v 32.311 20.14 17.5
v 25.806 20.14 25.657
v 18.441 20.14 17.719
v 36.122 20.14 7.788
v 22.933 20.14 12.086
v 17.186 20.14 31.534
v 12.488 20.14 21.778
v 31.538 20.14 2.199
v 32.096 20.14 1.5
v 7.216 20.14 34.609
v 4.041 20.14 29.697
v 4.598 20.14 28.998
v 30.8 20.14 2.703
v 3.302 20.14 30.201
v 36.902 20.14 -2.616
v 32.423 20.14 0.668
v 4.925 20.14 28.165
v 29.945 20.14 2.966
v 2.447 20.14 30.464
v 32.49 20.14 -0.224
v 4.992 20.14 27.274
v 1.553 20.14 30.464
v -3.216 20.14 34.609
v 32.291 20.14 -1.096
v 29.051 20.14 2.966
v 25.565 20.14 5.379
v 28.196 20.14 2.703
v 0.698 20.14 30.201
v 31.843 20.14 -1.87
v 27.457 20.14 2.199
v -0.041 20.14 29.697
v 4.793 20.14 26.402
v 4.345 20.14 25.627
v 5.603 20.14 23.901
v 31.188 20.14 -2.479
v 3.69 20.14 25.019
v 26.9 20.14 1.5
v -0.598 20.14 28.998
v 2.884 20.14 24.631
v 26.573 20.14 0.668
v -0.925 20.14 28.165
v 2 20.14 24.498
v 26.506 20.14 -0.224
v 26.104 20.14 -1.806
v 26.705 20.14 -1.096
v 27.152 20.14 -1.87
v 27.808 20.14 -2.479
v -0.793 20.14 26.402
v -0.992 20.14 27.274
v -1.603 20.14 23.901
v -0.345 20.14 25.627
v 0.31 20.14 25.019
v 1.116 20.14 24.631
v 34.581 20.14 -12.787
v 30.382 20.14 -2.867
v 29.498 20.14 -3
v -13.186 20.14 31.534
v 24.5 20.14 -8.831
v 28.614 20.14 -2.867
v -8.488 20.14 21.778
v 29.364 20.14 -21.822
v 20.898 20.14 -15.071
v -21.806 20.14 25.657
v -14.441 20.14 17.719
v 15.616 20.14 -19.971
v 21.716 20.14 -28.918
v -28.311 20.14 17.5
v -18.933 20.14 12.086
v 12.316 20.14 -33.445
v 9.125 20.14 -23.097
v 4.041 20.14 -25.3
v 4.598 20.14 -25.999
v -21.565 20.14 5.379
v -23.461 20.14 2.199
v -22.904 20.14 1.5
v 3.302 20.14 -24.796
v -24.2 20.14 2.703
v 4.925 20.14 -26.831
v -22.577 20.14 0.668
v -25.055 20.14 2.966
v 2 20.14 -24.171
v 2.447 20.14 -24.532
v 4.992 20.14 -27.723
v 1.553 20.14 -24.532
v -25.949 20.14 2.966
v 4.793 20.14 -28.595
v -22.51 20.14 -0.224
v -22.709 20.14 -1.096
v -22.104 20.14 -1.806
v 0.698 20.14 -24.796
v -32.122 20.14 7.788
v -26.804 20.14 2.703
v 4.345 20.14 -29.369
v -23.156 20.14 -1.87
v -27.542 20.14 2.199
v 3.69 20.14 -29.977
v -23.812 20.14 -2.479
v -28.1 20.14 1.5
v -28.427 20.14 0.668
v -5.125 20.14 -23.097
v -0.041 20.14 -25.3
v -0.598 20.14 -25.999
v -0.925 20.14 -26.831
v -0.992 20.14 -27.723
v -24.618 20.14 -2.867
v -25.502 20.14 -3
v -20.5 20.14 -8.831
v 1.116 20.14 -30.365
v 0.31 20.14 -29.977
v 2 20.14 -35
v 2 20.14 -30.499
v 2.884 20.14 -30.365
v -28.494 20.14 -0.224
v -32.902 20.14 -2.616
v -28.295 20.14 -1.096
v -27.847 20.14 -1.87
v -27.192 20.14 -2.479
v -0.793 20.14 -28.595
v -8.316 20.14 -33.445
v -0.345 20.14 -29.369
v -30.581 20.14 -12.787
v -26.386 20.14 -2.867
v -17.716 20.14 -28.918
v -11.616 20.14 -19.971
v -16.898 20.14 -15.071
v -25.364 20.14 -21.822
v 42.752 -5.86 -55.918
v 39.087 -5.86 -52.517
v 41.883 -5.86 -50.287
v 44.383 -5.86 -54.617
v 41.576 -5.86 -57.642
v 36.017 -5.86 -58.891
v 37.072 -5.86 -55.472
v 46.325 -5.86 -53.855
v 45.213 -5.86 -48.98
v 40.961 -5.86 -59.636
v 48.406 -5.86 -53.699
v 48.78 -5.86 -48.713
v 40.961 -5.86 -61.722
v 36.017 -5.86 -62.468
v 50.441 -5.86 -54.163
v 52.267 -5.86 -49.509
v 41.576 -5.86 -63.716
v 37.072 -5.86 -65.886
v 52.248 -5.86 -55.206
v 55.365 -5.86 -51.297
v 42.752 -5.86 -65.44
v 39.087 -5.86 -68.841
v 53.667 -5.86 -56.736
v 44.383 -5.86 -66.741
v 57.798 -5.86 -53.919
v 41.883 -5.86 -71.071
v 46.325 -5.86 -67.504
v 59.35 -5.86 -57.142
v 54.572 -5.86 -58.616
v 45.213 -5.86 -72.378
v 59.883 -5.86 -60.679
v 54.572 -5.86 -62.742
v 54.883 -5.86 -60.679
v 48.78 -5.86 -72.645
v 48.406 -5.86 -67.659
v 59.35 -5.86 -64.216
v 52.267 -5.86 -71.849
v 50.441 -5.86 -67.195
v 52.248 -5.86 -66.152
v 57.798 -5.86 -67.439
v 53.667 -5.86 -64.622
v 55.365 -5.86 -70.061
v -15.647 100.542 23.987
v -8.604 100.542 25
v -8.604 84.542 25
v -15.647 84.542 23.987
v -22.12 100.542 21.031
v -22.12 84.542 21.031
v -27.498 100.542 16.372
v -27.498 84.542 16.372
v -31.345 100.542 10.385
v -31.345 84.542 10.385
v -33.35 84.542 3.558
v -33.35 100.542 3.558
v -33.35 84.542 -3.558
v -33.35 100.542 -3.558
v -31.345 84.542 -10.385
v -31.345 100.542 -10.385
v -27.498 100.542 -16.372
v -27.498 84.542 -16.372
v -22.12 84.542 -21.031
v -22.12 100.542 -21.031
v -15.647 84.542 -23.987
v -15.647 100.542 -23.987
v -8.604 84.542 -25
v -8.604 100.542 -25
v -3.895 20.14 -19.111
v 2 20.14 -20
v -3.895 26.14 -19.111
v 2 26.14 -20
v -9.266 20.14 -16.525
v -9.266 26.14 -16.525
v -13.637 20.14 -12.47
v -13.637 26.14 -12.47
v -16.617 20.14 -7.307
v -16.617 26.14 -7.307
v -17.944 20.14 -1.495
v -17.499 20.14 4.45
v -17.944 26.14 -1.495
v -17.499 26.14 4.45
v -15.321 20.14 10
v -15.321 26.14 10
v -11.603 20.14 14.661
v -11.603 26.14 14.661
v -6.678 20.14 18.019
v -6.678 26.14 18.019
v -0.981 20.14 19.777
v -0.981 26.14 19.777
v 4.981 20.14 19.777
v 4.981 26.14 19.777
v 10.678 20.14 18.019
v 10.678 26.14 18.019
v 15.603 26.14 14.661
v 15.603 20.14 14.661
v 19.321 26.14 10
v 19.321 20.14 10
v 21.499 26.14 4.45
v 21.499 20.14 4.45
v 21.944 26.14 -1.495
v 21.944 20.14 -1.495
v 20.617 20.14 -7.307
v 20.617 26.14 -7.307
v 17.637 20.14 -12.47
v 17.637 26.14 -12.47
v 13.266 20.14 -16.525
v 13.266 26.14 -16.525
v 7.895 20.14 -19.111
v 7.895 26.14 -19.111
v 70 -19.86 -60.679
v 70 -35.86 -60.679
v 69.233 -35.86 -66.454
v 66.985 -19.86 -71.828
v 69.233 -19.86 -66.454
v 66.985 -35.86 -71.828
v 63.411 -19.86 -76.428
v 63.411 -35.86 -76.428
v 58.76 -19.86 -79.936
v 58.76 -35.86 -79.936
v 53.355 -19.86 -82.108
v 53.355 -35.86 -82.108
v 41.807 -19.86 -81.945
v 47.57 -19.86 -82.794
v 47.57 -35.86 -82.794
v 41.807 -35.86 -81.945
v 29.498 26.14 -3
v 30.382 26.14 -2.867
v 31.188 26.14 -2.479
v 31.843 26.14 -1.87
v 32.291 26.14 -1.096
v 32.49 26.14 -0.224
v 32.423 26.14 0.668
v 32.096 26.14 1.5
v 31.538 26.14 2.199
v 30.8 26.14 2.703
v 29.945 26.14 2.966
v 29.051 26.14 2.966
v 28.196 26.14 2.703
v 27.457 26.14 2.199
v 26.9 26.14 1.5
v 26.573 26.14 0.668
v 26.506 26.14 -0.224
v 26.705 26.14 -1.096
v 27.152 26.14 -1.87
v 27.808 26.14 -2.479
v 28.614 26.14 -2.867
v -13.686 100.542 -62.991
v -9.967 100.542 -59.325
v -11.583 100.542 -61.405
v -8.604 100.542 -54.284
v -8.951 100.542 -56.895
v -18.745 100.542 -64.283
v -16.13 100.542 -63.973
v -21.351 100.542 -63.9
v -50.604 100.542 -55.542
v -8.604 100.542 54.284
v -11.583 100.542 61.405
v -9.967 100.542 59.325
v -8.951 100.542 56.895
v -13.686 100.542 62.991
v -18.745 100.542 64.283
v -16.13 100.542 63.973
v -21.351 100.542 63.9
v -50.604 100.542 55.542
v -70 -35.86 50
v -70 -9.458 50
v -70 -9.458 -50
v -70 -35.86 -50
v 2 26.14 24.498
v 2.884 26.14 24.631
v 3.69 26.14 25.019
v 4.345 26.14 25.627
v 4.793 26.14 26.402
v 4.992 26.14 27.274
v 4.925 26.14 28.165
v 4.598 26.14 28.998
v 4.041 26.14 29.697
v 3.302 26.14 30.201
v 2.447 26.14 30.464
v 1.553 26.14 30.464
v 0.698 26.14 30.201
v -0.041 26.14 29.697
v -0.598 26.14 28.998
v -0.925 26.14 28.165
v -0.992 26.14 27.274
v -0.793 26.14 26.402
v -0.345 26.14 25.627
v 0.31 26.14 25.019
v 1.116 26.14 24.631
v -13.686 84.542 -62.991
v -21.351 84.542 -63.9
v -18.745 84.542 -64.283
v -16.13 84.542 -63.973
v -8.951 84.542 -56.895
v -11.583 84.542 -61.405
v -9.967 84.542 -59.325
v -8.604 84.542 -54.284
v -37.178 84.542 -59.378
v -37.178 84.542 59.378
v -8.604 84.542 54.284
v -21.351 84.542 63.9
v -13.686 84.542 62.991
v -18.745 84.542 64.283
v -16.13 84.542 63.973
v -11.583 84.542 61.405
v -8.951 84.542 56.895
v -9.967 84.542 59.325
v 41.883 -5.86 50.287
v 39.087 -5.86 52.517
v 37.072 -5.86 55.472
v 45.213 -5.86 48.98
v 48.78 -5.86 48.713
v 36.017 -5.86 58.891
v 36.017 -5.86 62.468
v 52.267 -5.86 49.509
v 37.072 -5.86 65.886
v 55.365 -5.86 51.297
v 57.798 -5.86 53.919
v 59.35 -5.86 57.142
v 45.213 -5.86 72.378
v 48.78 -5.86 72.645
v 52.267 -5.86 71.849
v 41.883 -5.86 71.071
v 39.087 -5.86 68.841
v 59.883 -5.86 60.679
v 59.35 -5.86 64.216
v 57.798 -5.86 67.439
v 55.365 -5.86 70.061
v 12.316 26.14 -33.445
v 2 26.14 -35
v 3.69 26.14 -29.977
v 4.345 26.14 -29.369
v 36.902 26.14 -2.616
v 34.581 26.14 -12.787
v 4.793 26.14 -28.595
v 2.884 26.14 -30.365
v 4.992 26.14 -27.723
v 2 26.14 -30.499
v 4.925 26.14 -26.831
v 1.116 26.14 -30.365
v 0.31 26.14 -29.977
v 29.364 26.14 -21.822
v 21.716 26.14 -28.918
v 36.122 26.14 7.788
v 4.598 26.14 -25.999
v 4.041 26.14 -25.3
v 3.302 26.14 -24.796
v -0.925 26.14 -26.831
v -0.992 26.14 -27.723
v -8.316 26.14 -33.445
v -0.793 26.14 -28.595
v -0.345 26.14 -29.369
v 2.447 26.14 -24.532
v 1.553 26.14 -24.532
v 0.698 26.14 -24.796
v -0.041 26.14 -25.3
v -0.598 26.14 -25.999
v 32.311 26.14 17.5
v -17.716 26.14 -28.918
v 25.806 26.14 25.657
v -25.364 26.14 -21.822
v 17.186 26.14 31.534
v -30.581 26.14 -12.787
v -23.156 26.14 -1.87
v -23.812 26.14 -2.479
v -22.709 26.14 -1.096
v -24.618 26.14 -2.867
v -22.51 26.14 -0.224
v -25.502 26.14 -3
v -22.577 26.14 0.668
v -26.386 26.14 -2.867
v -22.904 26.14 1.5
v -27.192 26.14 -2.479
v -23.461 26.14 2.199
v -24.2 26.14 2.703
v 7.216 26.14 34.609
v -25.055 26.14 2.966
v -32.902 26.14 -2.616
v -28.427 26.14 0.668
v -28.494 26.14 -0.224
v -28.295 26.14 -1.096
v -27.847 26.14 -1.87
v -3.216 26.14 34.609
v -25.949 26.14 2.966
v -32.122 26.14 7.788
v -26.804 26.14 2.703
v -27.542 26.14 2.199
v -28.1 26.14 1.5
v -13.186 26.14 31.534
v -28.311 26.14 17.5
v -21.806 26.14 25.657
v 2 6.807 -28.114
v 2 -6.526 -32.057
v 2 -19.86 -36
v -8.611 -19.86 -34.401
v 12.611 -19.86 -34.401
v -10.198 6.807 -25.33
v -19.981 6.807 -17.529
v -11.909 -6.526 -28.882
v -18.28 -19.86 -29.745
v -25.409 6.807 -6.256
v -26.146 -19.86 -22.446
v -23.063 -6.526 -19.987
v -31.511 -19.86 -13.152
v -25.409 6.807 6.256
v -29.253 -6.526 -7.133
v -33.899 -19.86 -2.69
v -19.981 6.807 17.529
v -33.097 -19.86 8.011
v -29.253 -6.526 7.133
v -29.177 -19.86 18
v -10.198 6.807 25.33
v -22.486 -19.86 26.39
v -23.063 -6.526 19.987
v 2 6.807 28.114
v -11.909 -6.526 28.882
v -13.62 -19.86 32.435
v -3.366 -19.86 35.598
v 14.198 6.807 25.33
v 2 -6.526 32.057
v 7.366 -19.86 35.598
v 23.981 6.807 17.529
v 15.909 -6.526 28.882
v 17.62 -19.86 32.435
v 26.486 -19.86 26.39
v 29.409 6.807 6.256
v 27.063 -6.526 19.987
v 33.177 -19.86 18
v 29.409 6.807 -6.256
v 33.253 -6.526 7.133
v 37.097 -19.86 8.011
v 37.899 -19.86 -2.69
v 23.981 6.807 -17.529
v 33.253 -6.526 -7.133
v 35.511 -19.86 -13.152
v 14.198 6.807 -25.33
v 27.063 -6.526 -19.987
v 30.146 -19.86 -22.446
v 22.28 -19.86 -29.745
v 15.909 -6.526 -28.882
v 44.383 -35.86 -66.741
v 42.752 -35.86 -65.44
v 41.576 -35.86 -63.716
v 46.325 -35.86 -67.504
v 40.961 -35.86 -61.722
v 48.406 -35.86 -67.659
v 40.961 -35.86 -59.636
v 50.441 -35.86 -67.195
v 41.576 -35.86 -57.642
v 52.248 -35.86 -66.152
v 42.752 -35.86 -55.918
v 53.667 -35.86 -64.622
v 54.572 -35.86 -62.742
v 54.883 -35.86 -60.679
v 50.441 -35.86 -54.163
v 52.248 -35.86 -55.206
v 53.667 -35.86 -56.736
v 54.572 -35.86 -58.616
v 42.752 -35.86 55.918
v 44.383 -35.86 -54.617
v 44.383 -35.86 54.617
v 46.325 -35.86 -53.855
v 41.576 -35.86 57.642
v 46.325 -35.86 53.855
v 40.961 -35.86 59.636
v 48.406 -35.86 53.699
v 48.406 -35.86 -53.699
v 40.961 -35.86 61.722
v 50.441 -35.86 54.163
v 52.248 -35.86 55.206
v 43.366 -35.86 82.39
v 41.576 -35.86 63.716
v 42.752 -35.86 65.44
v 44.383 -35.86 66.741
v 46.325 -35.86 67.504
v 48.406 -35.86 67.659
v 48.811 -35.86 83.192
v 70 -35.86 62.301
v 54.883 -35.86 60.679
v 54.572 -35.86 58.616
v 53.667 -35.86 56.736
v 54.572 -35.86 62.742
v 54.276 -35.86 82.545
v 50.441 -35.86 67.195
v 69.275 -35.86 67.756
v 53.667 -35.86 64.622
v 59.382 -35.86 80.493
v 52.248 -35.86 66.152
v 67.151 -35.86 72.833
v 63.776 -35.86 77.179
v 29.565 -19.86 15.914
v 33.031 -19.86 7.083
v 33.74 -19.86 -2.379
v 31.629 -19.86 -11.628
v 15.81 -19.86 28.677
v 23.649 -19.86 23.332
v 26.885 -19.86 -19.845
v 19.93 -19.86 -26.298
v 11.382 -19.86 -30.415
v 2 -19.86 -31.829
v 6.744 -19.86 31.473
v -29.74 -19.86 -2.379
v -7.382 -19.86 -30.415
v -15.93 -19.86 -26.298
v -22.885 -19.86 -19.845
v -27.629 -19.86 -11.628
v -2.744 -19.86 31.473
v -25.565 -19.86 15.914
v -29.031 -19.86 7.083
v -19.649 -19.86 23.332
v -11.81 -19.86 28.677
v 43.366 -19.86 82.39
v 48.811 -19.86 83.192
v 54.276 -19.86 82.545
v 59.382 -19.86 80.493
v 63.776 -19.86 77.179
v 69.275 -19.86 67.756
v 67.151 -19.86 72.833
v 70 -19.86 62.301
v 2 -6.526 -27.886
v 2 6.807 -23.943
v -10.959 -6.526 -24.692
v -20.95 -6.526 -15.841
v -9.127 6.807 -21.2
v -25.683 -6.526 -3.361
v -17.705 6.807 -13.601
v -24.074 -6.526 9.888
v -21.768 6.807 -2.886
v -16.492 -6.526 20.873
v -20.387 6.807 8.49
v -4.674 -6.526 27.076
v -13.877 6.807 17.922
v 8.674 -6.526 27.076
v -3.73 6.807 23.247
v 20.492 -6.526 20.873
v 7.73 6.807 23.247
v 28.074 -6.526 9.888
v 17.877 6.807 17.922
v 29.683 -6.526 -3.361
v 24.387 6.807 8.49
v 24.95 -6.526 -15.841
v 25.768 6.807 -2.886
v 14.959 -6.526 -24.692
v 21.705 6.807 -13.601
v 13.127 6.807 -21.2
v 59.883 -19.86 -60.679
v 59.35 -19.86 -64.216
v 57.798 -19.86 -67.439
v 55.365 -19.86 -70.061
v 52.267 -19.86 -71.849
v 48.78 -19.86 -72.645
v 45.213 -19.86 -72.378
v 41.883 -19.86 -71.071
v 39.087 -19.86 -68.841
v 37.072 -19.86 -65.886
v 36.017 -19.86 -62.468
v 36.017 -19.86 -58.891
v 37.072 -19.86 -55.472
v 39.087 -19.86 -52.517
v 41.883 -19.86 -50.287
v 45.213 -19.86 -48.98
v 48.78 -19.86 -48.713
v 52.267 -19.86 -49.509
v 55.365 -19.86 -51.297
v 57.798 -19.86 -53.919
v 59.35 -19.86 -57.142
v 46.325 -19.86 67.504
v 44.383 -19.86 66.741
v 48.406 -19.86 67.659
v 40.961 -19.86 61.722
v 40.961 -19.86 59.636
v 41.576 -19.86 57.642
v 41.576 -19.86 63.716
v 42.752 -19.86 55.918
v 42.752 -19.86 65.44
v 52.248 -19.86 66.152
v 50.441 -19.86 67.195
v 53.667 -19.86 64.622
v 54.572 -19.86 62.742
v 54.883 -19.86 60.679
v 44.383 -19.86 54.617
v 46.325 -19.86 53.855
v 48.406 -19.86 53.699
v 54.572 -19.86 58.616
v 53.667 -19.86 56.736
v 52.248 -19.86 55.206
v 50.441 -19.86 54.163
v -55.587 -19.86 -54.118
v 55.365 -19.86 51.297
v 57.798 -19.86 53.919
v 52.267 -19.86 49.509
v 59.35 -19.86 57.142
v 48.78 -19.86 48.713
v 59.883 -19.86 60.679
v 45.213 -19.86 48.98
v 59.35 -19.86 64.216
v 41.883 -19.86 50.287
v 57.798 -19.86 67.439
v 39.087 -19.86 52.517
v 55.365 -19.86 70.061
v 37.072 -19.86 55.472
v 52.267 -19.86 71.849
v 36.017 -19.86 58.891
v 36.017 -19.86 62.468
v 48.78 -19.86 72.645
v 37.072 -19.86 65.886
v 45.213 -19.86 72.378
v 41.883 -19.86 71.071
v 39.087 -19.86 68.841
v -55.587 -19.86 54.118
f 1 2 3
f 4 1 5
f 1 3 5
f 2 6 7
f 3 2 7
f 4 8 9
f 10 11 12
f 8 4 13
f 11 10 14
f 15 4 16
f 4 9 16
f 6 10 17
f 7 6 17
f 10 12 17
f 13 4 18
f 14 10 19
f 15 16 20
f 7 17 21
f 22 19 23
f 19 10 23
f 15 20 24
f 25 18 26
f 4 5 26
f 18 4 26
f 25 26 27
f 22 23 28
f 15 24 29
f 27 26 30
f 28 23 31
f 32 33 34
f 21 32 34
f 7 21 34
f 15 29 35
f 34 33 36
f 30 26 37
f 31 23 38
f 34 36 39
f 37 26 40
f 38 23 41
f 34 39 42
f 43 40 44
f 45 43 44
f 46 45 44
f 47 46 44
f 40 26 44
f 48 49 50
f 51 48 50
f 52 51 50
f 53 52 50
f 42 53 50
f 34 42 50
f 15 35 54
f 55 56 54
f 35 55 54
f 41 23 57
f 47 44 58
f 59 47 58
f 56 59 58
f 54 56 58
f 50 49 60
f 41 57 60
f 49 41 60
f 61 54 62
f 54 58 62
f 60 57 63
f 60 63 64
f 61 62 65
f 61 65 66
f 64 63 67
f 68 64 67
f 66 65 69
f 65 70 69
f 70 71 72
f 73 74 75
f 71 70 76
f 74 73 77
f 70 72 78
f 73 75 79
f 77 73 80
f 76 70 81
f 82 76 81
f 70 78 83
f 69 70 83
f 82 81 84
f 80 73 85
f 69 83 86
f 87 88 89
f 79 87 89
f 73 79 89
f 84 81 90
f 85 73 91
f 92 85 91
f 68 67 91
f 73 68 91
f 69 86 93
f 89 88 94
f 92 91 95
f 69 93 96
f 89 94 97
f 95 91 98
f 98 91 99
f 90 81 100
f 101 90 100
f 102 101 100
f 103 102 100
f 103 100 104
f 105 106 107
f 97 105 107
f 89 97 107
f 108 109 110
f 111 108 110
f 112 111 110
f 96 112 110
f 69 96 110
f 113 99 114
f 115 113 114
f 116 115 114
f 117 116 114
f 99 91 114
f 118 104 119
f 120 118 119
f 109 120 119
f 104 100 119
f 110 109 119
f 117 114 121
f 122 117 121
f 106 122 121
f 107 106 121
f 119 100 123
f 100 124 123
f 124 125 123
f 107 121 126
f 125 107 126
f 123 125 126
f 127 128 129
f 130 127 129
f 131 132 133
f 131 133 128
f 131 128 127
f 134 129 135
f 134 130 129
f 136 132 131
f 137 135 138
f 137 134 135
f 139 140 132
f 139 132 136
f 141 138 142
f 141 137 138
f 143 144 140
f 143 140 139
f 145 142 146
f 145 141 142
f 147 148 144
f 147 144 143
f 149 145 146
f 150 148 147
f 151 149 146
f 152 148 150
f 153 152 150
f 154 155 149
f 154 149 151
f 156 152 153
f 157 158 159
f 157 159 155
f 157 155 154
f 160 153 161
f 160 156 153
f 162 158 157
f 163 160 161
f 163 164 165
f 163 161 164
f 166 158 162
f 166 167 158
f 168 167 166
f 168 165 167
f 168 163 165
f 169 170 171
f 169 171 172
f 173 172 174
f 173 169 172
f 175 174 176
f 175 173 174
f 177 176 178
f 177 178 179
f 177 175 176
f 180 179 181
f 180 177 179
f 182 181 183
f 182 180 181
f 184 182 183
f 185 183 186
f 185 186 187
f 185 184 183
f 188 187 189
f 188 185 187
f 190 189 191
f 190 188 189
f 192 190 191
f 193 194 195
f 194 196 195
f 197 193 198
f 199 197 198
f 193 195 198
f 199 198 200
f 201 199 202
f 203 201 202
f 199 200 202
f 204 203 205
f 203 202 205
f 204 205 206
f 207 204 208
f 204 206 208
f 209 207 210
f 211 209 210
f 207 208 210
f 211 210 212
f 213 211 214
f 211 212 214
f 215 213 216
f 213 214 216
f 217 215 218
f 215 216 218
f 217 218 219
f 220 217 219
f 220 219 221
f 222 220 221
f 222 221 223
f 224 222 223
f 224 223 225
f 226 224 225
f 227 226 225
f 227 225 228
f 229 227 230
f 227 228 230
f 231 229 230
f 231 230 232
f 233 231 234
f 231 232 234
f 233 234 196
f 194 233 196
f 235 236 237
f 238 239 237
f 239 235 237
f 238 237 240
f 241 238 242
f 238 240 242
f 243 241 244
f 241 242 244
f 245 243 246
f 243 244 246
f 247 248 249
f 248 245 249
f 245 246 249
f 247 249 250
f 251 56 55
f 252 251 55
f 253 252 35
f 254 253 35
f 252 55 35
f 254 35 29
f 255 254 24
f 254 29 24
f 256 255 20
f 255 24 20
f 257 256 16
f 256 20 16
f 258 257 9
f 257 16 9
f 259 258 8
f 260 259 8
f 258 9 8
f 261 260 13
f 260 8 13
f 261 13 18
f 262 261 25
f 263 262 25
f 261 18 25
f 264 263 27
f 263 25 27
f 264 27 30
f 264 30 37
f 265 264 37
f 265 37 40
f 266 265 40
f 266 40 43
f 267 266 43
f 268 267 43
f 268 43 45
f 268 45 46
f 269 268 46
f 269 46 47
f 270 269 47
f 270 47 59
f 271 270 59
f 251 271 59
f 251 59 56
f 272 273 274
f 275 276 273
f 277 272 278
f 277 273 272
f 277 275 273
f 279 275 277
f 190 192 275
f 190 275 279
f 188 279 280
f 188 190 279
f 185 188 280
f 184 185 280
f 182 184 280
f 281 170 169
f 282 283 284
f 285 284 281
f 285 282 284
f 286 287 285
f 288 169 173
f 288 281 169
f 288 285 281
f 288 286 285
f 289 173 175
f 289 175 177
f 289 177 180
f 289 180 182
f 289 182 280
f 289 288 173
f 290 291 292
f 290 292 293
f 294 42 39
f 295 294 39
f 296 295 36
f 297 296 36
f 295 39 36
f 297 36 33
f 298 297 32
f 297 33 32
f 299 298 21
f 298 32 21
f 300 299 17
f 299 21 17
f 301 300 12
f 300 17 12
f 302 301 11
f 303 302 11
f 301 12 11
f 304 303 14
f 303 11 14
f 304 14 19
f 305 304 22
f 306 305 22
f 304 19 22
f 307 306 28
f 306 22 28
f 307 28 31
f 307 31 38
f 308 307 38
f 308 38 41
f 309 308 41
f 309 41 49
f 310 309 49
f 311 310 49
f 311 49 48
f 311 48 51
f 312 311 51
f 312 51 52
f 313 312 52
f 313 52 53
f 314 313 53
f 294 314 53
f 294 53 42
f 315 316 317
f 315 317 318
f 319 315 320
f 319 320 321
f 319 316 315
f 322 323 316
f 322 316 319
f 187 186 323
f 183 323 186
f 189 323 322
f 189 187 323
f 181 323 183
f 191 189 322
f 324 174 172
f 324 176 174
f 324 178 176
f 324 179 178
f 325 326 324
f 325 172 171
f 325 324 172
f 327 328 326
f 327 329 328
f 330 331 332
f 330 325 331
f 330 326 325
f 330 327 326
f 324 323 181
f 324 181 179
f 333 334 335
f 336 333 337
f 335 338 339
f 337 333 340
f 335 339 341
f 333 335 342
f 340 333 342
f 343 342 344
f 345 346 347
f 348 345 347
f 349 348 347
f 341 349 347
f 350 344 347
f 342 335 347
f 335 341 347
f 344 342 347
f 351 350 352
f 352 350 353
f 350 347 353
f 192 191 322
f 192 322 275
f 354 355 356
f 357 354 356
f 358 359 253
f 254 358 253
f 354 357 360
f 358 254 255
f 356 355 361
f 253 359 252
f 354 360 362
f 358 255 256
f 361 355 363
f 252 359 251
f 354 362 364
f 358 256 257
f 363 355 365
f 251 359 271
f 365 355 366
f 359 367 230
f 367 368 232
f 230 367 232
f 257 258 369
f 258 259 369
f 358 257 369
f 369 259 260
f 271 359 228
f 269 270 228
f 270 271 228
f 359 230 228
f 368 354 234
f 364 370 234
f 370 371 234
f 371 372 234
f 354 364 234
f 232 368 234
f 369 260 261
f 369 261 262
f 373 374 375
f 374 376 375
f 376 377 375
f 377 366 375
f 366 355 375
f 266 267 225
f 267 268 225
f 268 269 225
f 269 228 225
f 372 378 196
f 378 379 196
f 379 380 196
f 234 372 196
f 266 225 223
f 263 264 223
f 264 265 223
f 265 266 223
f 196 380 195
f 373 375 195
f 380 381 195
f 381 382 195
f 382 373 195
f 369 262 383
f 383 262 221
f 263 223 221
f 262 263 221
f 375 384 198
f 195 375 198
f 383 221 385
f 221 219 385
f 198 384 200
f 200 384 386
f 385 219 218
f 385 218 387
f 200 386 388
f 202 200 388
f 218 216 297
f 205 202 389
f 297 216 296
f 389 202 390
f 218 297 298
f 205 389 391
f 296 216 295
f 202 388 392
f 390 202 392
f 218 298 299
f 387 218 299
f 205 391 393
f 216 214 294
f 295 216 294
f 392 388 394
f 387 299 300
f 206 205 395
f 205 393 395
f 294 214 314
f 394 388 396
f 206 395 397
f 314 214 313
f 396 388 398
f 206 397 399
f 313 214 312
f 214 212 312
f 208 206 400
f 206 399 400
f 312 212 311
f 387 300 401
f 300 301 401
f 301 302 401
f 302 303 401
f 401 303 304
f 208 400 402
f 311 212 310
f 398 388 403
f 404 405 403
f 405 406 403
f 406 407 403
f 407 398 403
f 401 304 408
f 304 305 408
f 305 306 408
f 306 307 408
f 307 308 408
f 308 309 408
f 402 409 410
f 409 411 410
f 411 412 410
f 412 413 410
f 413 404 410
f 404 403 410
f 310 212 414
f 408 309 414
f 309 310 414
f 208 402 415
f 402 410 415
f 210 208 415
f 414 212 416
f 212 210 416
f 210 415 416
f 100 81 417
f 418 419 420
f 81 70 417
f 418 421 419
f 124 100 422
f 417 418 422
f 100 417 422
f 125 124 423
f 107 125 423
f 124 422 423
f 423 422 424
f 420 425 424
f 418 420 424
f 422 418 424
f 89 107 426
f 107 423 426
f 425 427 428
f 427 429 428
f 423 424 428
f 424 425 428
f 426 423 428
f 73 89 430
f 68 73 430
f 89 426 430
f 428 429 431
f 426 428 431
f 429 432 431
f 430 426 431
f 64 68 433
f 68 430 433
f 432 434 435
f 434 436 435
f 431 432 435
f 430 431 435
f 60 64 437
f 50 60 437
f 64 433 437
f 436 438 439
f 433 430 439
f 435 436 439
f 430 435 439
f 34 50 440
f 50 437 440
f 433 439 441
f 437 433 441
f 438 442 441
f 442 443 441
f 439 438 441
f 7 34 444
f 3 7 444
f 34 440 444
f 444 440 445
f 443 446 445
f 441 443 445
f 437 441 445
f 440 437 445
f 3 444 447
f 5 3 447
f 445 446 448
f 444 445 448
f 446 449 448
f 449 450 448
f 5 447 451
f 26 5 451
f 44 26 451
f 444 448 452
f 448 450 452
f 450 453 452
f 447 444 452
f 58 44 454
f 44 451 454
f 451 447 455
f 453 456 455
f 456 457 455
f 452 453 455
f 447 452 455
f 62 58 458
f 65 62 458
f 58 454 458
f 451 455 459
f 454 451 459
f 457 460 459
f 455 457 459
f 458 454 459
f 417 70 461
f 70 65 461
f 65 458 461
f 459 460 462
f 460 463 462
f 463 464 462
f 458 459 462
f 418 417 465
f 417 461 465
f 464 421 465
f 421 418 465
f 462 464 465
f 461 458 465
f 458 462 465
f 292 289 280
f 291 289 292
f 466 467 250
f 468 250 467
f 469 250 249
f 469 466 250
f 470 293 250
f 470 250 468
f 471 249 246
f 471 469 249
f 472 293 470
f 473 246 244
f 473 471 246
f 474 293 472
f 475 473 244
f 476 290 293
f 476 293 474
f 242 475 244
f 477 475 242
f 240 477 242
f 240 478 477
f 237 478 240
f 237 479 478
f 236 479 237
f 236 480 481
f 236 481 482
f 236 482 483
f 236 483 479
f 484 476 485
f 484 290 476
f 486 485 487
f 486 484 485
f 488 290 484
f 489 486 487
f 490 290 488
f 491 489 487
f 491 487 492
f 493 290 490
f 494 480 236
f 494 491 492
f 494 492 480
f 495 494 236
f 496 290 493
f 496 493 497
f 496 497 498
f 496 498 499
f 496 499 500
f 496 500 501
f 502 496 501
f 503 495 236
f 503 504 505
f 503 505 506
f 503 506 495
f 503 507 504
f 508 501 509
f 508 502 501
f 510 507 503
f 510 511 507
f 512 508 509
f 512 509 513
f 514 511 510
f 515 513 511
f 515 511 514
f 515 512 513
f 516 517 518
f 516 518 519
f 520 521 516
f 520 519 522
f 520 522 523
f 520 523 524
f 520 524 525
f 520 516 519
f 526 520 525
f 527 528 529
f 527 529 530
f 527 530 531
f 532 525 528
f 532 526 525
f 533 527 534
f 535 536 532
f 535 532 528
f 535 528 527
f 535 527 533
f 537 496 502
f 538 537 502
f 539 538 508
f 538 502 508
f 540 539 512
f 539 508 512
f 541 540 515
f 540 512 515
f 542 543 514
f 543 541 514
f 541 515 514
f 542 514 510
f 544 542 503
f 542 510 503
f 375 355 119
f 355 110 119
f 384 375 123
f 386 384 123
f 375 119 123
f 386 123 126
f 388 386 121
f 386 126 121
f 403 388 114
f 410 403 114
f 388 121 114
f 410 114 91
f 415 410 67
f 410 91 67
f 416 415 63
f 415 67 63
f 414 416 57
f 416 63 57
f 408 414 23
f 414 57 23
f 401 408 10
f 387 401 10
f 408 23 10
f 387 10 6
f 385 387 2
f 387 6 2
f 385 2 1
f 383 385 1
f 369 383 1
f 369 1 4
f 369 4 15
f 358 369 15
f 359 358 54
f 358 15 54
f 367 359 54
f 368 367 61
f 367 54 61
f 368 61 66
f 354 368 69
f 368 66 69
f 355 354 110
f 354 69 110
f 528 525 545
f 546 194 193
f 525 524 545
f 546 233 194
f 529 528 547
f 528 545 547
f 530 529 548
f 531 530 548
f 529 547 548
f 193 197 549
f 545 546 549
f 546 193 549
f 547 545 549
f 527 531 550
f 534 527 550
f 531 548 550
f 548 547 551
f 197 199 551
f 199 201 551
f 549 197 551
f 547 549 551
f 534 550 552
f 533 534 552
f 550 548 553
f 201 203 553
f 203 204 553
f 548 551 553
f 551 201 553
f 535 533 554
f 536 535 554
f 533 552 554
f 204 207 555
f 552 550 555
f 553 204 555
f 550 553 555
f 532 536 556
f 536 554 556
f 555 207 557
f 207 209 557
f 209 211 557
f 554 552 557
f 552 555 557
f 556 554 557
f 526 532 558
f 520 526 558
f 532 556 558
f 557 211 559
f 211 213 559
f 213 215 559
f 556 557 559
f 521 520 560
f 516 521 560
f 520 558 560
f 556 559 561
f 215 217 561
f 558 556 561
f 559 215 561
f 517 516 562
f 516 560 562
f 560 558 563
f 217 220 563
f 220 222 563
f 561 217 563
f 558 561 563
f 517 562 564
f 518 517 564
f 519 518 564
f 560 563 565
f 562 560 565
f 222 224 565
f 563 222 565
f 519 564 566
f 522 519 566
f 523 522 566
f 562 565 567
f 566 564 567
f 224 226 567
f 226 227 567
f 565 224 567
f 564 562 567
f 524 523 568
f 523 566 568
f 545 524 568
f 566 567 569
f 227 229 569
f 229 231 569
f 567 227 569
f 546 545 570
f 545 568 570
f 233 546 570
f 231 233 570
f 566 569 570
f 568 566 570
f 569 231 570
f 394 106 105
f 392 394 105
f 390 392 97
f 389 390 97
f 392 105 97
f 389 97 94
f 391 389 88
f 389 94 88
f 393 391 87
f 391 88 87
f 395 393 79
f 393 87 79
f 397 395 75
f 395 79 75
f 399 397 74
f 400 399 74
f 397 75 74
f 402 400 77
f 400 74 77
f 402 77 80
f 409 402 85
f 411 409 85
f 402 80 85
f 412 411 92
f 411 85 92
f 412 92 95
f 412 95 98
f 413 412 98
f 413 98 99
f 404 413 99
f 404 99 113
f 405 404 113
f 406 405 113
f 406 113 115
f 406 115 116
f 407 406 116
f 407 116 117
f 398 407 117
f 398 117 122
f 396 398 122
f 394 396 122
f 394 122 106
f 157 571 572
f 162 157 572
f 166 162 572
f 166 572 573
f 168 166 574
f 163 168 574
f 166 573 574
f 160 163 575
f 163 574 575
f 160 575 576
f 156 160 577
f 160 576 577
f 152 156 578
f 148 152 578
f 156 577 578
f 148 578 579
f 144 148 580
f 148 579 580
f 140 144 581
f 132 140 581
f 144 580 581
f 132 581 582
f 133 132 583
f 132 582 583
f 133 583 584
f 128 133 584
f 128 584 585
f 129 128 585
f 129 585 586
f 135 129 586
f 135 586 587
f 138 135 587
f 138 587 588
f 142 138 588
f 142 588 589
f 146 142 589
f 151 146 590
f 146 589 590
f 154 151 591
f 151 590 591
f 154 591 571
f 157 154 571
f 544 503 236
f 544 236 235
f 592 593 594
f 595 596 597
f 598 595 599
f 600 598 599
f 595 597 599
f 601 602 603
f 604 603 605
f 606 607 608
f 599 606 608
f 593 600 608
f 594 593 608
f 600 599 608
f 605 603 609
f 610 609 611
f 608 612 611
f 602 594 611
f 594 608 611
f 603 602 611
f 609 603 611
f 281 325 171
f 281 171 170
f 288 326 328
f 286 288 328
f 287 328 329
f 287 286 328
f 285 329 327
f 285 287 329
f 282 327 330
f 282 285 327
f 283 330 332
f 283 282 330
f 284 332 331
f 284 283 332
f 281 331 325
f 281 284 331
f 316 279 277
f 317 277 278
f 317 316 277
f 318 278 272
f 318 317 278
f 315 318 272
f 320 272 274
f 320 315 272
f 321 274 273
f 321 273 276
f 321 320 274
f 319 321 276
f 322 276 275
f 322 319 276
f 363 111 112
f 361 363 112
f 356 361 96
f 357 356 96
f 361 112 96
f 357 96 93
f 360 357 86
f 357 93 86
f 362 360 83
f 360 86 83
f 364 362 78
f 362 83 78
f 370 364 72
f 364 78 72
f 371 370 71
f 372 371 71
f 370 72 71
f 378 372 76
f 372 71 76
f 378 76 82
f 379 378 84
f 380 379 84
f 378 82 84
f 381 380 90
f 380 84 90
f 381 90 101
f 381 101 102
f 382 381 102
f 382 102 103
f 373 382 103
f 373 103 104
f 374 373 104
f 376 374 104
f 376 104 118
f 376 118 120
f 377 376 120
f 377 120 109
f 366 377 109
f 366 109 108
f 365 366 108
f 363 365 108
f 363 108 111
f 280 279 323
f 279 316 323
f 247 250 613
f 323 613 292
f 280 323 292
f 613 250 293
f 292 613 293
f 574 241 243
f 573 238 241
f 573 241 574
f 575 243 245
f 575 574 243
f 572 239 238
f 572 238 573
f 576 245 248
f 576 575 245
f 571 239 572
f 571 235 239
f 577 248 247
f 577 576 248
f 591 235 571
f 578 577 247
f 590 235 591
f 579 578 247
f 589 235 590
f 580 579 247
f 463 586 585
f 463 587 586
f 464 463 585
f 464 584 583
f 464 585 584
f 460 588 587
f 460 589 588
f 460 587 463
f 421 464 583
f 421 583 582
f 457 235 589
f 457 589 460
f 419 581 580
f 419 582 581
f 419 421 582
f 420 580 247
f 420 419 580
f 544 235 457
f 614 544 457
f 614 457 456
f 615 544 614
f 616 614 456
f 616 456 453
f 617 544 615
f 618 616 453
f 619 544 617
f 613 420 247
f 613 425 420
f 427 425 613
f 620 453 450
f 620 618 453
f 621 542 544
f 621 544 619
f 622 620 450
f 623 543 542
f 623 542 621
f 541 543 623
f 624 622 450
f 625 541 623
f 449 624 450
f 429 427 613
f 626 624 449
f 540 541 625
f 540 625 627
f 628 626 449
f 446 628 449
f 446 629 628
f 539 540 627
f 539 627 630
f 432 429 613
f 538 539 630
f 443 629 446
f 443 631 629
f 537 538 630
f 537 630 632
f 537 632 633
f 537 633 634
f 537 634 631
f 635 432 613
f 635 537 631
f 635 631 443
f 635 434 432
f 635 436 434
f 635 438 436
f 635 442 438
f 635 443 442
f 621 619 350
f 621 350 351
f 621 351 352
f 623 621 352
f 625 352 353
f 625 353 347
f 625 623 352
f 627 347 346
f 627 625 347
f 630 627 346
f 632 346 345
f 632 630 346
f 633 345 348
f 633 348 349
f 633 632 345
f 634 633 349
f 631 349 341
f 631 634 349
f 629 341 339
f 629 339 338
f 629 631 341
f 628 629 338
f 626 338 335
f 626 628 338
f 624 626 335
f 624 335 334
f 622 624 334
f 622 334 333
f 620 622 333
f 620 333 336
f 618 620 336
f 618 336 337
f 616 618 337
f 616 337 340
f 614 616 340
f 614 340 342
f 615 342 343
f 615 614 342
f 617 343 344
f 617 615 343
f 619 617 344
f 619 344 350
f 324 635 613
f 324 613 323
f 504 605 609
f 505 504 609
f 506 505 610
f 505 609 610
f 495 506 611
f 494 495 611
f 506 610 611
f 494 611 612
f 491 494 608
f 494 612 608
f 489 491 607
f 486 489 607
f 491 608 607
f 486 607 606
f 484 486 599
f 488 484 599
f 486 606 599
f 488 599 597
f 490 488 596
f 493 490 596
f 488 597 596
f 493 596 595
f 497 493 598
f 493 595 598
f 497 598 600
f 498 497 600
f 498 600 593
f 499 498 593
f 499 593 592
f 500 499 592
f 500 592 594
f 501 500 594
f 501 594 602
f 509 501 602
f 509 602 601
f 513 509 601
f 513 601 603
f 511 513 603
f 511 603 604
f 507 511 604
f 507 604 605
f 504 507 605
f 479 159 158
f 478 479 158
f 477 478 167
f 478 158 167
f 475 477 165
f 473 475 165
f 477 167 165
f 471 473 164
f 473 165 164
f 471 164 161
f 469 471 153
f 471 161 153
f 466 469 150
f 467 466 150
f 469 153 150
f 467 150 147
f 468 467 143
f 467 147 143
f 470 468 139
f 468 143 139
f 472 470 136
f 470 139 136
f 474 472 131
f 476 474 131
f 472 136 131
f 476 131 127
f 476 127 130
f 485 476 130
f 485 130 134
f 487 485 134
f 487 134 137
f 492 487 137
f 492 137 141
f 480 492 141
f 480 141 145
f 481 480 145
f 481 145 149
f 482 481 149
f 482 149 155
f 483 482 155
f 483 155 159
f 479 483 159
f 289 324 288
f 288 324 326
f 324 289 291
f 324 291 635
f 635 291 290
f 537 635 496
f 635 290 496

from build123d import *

# Parameters (mm, degrees)
SALIENTE_EXTRUIR1_DEPTH              = 90
CORTAR_EXTRUIR1_DEPTH                = 153.015667403
CORTAR_EXTRUIR1_DEPTH_BACK           = 153.015667403
CROQUIS2_OUTSIDE_W                   = 195.144
CROQUIS2_OUTSIDE_H                   = 235.144
REDONDEO1_R                          = 10
CROQUIS3_R                           = 12
SALIENTE_EXTRUIR2_DEPTH              = 14
CORTAR_EXTRUIR2_DEPTH                = 16
TALADRO1_D                           = 6
TALADRO1_DEPTH                       = 6
TALADRO_ROSCADO_M163_REACH           = 216.283
TALADRO_ROSCADO_M163_BORE_R          = 7
TALADRO_ROSCADO_M163_ON_FACE_2_REACH = 223.31
TALADRO_ROSCADO_M163_BORE_2_R        = 7


with BuildPart() as part:
    # Croquis1 → Saliente-Extruir1 (new, symmetric)
    with BuildSketch(Plane.XY):
        Polygon((-70, -35.859640122), (70, -35.859640122), (70, -19.859640122), (-55.587324838, -19.859640122), (-37.178438023, 84.54234499), (-8.604032122, 84.54234499), (-8.604032122, 100.54234499), (-50.604032122, 100.54234499), (-70, -9.45765501), align=None)
    extrude(amount=SALIENTE_EXTRUIR1_DEPTH, both=True)

    # Croquis2 outside → Cortar-Extruir1 (cut, two sides: drawn at the far end of the back side and taken through both)
    with BuildSketch(Plane(origin=(0, 0, 0), x_dir=(1, 0, 0), z_dir=(0, 1, 0)).offset(-CORTAR_EXTRUIR1_DEPTH_BACK)):
        Rectangle(CROQUIS2_OUTSIDE_W, CROQUIS2_OUTSIDE_H)
        with BuildLine():
            Line((-70, 50), (-70, -50))
            Line((-70, -50), (43.366457067, -82.390416305))
            ThreePointArc((43.366457067, -82.390416305), (61.688422944, -78.981093081), (70, -62.300697244))
            Line((70, -62.300697244), (70, 60.679009052))
            ThreePointArc((70, 60.679009052), (61.20181191, 78.335978242), (41.807165035, 81.944904296))
            Line((41.807165035, 81.944904296), (-70, 50))
        make_face(mode=Mode.SUBTRACT)
    extrude(amount=CORTAR_EXTRUIR1_DEPTH + CORTAR_EXTRUIR1_DEPTH_BACK, mode=Mode.SUBTRACT)

    # Redondeo1
    redondeo1_edges = [part.edges().sort_by_distance(p)[0] for p in [
        (-8.604032122, 92.54234499, -67.541705108),
        (-8.604032122, 92.54234499, 67.541705108),
    ]]
    fillet(redondeo1_edges, radius=REDONDEO1_R)

    # Croquis3 → Saliente-Extruir2 (add)
    with BuildSketch(Plane(origin=(0, -19.859640122, 0), x_dir=(1, 0, 0), z_dir=(0, 1, 0))):
        with Locations((47.883135105, 60.679009052)):
            Circle(CROQUIS3_R)
    saliente_extruir2 = extrude(amount=SALIENTE_EXTRUIR2_DEPTH)

    # Simetría4: Saliente-Extruir2 across plane
    add(saliente_extruir2.mirror(Plane.XY))

    # Croquis4 → Cortar-Extruir2 (cut)
    with BuildSketch(Plane(origin=(0, 100.54234499, 0), x_dir=(1, 0, 0), z_dir=(0, 1, 0))):
        with BuildLine():
            Line((-8.604032122, 25), (-8.604032122, -25))
            ThreePointArc((-8.604032122, -25), (-33.604032122, 0), (-8.604032122, 25))
        make_face()
    extrude(amount=-CORTAR_EXTRUIR2_DEPTH, mode=Mode.SUBTRACT)

    # Croquis5 → Revolución1 (revolve)
    with BuildSketch(Plane.XY, mode=Mode.PRIVATE) as revoluci_n1_sk:
        Polygon((37, 26.140359878), (37, 20.140359878), (26.171234463, 20.140359878), (38, -19.859640122), (33.828765537, -19.859640122), (22, 20.140359878), (22, 26.140359878), align=None)
    revolve(revoluci_n1_sk.sketch.rotate(Axis((2, -40.2659066, 0), (0, 1, 0)), 90), axis=Axis((2, -40.2659066, 0), (0, 1, 0)))

    # Taladro1
    with Locations(Plane(origin=(2, 26.140359878, -27.498672592), x_dir=(0, 0, 1), z_dir=(0, 1, 0))):
        with Locations((0, 0), (27.498673581, 27.497904202), (54.996574558, 0), (27.498672592, -27.501922028)):
            Hole(TALADRO1_D / 2, depth=TALADRO1_DEPTH)

    # Taladro roscado M163 bore (on position points) → Taladro roscado M163 (cut, up to next)
    with BuildSketch(Plane(origin=(47.883135105, -5.859640122, -60.679009052), x_dir=(1, 0, 0), z_dir=(0, 1, 0)), mode=Mode.PRIVATE) as taladro_roscado_m163_sk1:
        Circle(TALADRO_ROSCADO_M163_BORE_R)
    taladro_roscado_m163_tool1 = extrude(taladro_roscado_m163_sk1.sketch, amount=-TALADRO_ROSCADO_M163_REACH, mode=Mode.PRIVATE) & part.part
    add(taladro_roscado_m163_tool1.solids().sort_by_distance((47.883135, -5.85964, -60.679009))[0], mode=Mode.SUBTRACT)

    # Taladro roscado M163 bore 2 (on position points) → Taladro roscado M163 on face 2 (cut, up to next)
    with BuildSketch(Plane(origin=(47.883135105, -19.859640122, 60.679009052), x_dir=(1, 0, 0), z_dir=(0, 1, 0)), mode=Mode.PRIVATE) as taladro_roscado_m163_on_face_2_sk1:
        Circle(TALADRO_ROSCADO_M163_BORE_2_R)
    taladro_roscado_m163_on_face_2_tool1 = extrude(taladro_roscado_m163_on_face_2_sk1.sketch, amount=-TALADRO_ROSCADO_M163_ON_FACE_2_REACH, mode=Mode.PRIVATE) & part.part
    add(taladro_roscado_m163_on_face_2_tool1.solids().sort_by_distance((47.883135, -19.85964, 60.679009))[0], mode=Mode.SUBTRACT)


solid = part.part
